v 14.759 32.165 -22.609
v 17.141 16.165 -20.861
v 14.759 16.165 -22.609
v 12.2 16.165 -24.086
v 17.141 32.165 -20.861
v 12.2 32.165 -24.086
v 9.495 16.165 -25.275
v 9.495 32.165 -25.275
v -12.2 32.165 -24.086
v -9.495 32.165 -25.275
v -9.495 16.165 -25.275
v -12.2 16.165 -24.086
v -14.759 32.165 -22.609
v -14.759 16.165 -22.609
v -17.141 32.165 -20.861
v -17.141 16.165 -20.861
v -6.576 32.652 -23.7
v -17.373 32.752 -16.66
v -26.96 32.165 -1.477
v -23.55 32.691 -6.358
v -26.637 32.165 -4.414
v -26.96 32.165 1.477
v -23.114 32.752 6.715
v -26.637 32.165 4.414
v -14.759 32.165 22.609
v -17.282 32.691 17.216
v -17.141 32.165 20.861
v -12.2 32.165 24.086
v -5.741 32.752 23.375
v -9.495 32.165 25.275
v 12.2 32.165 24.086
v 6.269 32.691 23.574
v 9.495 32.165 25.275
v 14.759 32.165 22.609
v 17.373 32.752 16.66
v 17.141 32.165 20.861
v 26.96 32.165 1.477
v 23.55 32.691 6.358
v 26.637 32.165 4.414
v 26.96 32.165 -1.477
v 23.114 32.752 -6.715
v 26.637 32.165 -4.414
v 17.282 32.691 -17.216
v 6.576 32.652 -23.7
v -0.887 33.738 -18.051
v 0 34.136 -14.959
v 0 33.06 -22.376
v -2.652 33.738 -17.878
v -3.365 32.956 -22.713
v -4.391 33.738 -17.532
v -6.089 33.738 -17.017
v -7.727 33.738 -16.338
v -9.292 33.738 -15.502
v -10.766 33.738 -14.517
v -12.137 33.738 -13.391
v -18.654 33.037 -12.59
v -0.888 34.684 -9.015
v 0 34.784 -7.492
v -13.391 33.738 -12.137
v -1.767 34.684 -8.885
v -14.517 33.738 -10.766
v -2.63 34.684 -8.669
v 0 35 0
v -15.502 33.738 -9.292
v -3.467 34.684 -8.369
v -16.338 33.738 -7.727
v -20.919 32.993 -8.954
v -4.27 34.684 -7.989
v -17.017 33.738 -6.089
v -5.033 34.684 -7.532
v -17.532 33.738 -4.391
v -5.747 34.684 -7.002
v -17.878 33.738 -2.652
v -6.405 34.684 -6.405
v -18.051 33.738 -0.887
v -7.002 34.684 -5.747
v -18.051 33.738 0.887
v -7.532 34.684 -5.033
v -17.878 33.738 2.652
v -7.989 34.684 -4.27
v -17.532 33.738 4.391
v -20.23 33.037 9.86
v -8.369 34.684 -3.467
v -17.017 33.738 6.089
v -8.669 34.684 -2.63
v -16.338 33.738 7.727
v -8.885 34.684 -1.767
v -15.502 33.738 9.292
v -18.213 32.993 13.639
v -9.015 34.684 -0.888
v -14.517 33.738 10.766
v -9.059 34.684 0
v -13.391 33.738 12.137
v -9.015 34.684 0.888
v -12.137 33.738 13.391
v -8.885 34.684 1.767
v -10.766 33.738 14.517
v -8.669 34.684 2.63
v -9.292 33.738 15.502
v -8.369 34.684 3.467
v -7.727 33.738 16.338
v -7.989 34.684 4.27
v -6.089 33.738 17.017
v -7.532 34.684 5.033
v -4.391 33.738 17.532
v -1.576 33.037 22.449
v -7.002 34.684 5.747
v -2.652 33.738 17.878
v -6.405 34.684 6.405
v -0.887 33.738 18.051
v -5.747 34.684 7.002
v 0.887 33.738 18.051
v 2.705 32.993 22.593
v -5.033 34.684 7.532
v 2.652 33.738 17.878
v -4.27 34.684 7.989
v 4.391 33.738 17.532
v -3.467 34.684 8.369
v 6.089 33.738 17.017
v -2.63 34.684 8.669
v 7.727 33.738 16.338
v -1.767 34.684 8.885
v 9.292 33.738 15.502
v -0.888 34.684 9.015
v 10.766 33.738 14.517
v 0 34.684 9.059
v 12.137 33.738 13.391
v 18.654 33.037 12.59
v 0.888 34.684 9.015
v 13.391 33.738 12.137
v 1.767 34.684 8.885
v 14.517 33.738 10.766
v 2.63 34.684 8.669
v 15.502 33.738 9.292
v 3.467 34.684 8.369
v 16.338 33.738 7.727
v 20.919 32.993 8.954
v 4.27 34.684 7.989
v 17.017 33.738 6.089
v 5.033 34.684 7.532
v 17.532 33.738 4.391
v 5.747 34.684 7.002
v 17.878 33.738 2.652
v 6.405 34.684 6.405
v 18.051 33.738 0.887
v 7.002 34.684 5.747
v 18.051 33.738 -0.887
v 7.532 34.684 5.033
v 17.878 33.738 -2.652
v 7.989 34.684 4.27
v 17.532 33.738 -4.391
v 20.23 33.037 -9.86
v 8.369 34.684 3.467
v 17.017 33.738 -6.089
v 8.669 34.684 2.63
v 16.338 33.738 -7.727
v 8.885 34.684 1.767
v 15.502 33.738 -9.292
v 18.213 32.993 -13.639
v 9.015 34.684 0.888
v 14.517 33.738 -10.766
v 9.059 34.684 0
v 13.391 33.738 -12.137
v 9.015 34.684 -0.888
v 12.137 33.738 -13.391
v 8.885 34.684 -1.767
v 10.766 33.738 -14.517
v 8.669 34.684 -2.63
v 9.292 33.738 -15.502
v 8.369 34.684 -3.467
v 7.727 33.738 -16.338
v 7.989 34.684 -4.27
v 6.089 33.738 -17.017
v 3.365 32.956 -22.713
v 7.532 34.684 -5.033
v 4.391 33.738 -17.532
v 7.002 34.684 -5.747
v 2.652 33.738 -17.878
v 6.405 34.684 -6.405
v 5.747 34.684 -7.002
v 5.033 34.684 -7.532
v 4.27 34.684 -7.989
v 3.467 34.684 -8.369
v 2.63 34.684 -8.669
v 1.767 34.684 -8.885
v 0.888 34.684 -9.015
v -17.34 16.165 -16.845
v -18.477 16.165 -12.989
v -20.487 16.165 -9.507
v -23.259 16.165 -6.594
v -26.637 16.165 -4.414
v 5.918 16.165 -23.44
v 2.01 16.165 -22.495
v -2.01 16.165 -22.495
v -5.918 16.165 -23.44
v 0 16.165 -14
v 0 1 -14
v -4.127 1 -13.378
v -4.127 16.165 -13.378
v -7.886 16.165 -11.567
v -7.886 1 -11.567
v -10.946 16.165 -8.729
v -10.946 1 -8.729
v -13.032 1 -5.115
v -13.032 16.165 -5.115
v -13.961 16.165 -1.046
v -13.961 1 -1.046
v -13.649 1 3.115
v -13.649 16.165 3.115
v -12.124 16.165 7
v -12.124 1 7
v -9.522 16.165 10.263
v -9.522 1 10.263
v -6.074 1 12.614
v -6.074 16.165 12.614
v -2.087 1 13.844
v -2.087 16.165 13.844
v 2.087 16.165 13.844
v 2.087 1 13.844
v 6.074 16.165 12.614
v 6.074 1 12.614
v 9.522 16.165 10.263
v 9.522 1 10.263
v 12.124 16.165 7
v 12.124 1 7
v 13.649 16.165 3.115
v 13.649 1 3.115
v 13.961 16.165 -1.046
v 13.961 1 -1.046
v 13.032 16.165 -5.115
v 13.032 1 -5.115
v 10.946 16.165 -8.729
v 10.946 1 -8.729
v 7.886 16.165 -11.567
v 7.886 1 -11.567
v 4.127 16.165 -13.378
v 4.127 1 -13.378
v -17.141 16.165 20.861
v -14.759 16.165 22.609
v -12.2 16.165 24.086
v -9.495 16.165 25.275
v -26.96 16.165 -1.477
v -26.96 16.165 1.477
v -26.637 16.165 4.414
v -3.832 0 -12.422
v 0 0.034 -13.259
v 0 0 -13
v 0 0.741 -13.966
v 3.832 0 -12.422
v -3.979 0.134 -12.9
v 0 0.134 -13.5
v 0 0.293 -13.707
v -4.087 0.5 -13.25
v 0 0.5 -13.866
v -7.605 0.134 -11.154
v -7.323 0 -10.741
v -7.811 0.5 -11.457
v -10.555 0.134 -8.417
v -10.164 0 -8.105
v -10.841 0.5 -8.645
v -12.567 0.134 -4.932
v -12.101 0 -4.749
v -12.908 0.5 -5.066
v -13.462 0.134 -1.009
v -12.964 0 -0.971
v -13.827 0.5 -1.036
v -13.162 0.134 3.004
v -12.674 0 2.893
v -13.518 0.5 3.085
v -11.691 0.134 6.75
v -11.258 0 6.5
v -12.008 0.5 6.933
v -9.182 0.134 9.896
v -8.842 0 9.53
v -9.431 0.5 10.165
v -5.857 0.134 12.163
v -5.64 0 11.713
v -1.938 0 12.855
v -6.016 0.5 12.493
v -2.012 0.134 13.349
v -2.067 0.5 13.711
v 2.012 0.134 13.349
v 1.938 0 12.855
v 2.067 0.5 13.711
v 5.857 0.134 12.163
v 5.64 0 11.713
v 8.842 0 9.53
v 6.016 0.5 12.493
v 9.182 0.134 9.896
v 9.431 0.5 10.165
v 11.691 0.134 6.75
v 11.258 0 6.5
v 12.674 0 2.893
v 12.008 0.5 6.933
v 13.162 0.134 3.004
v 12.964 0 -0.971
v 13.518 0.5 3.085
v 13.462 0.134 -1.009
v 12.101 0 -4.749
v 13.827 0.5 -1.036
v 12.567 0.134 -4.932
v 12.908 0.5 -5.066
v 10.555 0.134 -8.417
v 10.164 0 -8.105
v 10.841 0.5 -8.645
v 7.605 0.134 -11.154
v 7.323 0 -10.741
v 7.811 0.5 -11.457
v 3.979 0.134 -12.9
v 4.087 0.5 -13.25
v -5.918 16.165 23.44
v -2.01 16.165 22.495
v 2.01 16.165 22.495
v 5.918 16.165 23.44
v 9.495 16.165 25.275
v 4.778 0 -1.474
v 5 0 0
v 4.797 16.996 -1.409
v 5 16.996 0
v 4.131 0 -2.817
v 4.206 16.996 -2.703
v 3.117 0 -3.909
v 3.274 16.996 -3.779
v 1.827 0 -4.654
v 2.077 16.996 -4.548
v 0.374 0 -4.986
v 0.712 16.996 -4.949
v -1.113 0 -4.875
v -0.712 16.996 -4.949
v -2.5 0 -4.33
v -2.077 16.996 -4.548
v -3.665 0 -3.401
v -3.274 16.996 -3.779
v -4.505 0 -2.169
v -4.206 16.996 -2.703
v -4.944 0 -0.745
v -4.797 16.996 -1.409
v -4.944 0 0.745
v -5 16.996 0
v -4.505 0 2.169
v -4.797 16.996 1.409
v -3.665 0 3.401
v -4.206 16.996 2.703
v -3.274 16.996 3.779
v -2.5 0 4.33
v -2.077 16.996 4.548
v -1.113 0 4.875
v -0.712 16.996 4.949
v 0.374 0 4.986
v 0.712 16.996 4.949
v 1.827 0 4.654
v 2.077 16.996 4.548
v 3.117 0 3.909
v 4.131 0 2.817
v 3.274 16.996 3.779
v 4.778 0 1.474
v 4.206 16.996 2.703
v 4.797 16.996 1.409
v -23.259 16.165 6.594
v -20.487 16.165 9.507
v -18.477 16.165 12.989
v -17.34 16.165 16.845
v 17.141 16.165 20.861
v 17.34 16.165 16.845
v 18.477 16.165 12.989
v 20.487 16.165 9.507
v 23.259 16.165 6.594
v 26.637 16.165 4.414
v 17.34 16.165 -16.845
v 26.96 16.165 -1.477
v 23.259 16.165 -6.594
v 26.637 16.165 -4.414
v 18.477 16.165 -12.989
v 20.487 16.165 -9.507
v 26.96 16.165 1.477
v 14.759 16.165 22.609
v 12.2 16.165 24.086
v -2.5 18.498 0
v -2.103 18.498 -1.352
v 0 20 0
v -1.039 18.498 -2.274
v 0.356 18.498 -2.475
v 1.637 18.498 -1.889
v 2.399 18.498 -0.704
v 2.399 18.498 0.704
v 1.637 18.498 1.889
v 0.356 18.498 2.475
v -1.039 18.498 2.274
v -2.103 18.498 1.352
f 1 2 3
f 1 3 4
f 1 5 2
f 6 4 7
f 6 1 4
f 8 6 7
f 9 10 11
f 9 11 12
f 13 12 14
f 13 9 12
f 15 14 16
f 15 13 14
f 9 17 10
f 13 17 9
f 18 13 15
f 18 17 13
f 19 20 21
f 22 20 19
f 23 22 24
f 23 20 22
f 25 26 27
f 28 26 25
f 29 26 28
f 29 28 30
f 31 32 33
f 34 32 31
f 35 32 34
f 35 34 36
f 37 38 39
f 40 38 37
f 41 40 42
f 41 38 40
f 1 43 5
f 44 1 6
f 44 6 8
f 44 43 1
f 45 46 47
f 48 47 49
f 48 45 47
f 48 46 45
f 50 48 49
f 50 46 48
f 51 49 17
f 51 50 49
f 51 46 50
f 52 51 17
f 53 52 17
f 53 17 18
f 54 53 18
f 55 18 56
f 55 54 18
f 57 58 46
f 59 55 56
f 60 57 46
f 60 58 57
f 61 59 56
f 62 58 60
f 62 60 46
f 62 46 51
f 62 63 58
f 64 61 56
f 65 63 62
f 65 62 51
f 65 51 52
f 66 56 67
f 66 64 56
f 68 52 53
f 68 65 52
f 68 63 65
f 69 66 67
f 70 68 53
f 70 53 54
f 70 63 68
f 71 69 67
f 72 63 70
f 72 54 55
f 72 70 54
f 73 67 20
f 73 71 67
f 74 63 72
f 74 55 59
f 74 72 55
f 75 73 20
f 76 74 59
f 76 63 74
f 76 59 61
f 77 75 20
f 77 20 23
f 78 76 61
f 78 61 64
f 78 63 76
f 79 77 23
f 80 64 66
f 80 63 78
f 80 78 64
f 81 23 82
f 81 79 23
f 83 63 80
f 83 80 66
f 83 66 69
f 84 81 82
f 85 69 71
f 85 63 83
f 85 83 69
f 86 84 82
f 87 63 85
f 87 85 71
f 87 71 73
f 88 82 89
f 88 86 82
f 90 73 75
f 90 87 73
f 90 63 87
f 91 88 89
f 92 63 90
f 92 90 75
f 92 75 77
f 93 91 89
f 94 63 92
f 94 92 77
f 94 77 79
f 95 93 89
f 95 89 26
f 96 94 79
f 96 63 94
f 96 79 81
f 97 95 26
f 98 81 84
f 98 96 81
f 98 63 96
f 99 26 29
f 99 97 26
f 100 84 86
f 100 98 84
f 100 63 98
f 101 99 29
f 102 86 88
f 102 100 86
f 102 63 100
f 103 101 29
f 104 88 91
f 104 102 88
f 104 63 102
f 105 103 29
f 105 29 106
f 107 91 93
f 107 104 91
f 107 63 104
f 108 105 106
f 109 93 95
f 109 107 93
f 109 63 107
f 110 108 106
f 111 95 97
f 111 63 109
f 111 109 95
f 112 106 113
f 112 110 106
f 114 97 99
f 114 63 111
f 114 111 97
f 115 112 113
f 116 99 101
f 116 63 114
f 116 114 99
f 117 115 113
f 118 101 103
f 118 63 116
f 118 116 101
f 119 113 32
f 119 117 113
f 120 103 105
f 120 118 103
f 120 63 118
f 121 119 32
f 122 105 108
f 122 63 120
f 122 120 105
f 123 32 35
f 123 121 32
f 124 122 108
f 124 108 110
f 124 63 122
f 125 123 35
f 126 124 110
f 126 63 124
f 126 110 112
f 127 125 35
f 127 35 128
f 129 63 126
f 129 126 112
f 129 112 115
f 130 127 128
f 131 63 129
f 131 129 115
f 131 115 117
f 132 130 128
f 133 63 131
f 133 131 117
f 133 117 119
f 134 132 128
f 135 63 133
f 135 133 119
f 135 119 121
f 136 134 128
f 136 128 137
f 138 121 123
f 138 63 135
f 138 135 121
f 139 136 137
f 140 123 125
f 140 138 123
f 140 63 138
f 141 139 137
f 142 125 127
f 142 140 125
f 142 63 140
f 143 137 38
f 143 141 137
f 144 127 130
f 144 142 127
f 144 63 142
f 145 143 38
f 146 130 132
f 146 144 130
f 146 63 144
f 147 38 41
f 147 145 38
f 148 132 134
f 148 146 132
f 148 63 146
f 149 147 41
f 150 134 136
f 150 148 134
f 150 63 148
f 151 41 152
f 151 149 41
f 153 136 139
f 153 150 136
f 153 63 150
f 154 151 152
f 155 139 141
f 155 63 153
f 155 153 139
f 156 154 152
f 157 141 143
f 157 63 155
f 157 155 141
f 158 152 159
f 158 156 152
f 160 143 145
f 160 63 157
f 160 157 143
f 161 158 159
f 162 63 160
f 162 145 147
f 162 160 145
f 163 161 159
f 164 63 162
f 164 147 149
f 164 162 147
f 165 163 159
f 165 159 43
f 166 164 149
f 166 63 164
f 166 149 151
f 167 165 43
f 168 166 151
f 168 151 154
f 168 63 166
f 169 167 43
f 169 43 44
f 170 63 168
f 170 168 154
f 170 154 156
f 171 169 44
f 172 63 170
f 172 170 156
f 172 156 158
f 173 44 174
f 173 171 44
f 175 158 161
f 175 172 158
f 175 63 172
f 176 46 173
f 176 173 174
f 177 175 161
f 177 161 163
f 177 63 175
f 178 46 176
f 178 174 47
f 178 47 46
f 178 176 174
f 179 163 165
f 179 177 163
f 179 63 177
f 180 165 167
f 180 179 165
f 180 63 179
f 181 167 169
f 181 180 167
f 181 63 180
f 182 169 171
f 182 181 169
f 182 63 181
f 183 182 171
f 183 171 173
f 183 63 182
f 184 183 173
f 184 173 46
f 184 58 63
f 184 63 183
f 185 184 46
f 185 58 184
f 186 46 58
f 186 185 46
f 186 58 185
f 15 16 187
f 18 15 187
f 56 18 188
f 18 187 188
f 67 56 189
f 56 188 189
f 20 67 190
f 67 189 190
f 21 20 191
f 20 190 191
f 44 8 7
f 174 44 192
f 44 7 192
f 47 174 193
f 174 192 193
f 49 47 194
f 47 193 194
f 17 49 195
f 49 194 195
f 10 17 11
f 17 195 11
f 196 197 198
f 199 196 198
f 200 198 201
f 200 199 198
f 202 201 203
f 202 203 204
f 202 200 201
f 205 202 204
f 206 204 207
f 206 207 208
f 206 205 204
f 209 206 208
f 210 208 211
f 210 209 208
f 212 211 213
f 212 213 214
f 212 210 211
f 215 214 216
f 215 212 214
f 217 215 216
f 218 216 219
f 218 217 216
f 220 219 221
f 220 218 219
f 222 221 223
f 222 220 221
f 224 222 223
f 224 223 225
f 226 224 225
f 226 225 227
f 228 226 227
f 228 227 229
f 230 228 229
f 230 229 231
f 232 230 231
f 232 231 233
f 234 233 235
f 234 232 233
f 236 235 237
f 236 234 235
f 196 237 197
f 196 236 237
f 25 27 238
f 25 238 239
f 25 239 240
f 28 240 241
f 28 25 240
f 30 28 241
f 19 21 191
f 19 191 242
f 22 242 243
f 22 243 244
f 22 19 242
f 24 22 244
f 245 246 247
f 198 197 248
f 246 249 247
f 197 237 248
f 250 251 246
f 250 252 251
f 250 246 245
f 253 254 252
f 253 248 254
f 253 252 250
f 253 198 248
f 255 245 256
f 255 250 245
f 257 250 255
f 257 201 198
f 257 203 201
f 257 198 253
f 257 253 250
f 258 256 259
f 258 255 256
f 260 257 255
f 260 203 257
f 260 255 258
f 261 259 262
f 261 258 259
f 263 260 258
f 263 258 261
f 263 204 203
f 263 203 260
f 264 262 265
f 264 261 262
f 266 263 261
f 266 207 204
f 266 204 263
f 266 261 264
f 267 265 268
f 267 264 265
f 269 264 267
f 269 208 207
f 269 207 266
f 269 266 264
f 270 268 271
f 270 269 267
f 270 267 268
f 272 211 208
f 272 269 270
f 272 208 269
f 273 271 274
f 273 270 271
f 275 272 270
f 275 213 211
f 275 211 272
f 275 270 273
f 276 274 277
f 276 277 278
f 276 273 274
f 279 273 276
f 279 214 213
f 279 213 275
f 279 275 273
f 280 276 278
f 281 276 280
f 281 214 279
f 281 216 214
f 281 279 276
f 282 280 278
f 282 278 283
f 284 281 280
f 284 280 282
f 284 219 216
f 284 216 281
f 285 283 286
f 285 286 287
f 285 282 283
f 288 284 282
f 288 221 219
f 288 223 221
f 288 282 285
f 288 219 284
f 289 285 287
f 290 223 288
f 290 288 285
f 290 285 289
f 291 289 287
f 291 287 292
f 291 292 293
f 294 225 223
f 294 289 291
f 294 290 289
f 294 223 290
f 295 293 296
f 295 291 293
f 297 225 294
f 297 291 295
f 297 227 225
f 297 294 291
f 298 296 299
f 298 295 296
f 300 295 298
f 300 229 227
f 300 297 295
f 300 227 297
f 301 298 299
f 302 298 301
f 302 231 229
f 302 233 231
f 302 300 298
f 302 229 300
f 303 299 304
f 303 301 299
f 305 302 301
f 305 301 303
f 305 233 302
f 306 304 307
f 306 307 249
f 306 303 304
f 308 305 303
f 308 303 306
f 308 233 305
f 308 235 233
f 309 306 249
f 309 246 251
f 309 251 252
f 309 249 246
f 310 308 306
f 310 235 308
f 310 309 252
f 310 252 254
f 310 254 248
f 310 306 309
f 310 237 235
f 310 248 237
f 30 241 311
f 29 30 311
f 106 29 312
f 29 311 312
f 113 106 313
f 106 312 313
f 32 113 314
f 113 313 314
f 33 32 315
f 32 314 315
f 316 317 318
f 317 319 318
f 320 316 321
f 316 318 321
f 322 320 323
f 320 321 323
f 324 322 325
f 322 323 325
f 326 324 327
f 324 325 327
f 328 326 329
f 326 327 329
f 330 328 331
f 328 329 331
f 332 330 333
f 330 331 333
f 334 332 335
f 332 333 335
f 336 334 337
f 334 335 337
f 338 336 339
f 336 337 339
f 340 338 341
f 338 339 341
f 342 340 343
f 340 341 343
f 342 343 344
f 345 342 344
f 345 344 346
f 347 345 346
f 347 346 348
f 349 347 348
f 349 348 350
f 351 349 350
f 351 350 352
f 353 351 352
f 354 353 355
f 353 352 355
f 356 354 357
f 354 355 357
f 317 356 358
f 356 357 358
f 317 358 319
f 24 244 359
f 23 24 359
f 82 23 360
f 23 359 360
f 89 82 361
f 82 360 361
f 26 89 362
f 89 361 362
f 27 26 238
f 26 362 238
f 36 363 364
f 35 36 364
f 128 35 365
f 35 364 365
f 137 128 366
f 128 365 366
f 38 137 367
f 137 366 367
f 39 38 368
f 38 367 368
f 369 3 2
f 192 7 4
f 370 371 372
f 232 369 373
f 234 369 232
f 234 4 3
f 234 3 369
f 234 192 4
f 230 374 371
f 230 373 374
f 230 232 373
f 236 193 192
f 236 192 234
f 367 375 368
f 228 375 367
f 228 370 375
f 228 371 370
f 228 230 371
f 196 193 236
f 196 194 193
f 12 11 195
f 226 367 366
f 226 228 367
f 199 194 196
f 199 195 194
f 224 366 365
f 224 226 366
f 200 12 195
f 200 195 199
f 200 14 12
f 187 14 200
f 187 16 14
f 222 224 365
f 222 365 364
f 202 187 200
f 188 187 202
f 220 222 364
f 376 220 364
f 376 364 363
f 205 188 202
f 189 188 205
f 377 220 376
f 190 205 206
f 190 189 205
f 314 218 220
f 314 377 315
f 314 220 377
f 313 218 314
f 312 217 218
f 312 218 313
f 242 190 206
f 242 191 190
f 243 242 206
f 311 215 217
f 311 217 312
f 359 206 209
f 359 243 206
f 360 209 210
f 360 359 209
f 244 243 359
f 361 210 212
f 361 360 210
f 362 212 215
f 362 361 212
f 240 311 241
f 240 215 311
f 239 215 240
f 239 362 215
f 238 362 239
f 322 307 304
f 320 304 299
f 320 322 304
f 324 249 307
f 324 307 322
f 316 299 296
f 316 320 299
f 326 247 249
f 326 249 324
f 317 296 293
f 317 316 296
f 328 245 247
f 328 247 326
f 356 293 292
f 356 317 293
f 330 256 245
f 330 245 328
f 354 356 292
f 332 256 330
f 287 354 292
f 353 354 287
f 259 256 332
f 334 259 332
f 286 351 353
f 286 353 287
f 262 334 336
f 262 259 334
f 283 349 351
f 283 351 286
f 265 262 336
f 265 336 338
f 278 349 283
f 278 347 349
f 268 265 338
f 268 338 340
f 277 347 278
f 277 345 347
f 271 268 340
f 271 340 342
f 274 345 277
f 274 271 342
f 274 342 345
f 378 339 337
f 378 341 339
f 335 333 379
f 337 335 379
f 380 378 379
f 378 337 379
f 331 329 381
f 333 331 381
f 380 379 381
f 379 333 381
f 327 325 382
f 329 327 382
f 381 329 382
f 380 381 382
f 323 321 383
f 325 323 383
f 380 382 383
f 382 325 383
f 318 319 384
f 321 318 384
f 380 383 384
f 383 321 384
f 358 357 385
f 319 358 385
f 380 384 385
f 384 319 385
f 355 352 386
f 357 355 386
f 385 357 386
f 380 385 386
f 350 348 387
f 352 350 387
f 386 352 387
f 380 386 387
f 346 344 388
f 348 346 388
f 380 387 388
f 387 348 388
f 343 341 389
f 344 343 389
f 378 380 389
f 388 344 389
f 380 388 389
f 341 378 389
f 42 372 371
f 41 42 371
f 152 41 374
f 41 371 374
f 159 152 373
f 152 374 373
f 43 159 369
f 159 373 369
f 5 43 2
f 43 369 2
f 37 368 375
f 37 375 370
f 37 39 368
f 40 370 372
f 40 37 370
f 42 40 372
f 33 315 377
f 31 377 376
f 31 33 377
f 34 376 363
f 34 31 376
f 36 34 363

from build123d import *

# Parameters (mm, degrees)
CUT_EXTRUDE_1_DEPTH         = 43.576377572
HOLE_WIZARD_10_0_10_1_D     = 10
HOLE_WIZARD_10_0_10_1_DEPTH = 16.995696905
HOLE_WIZARD_10_0_10_1_TIP   = 3.004303095
FILLET_1_R                  = 1


with BuildPart() as part:
    # 草图1 → 旋转1 (revolve)
    with BuildSketch(Plane.XY, mode=Mode.PRIVATE) as revolve_1_sk:
        with BuildLine():
            Line((0, 0), (-14, 0))
            Line((-14, 0), (-14, 16.165246825))
            Line((-14, 16.165246825), (-27, 16.165246825))
            Line((-27, 16.165246825), (-27, 32.165246825))
            ThreePointArc((-27, 32.165246825), (-13.574201869, 34.289369415), (0, 35))
            Line((0, 35), (0, 0))
        make_face()
    revolve(revolve_1_sk.sketch.rotate(Axis((0, 0, 0), (0, 1, 0)), 270), axis=Axis((0, 0, 0), (0, 1, 0)))

    # 草图2 → 切除-拉伸1 (cut, through all)
    with BuildSketch(Plane.XZ.offset(-16.165246825)):
        with BuildLine():
            ThreePointArc((-26.636693093, 4.414360778), (-19.378362398, 11.188102747), (-17.141295122, 20.860872502))
            ThreePointArc((-17.141295122, 20.860872502), (-23.382685902, 13.5), (-26.636693093, 4.414360778))
        make_face()
        with BuildLine():
            ThreePointArc((9.495397971, 25.27523328), (0, 27), (-9.495397971, 25.27523328))
            ThreePointArc((-9.495397971, 25.27523328), (0, 22.376205494), (9.495397971, 25.27523328))
        make_face()
        with BuildLine():
            ThreePointArc((26.636693093, 4.414360778), (23.382685902, 13.5), (17.141295122, 20.860872502))
            ThreePointArc((17.141295122, 20.860872502), (19.378362398, 11.188102747), (26.636693093, 4.414360778))
        make_face()
        with BuildLine():
            ThreePointArc((17.141295122, -20.860872502), (23.382685902, -13.5), (26.636693093, -4.414360778))
            ThreePointArc((26.636693093, -4.414360778), (19.378362398, -11.188102747), (17.141295122, -20.860872502))
        make_face()
        with BuildLine():
            ThreePointArc((9.495397971, -25.27523328), (0, -22.376205494), (-9.495397971, -25.27523328))
            ThreePointArc((-9.495397971, -25.27523328), (0, -27), (9.495397971, -25.27523328))
        make_face()
        with BuildLine():
            ThreePointArc((-17.141295122, -20.860872502), (-19.378362398, -11.188102747), (-26.636693093, -4.414360778))
            ThreePointArc((-26.636693093, -4.414360778), (-23.382685902, -13.5), (-17.141295122, -20.860872502))
        make_face()
    extrude(amount=-CUT_EXTRUDE_1_DEPTH, mode=Mode.SUBTRACT)

    # Ø10.0 (10) 直径孔1
    with Locations(Plane(origin=(0, 0, 0), x_dir=(-1, 0, 0), z_dir=(0, -1, 0))):
        with Locations((0, 0)):
            Hole(HOLE_WIZARD_10_0_10_1_D / 2, depth=HOLE_WIZARD_10_0_10_1_DEPTH)
            with Locations((0, 0, -(HOLE_WIZARD_10_0_10_1_DEPTH + HOLE_WIZARD_10_0_10_1_TIP / 2))):  # 118° drill point
                Cone(0, HOLE_WIZARD_10_0_10_1_D / 2, HOLE_WIZARD_10_0_10_1_TIP, mode=Mode.SUBTRACT)

    # 圆角1
    fillet_1_edges = [part.edges().sort_by_distance(p)[0] for p in [
        (0, 0, 14),
    ]]
    fillet(fillet_1_edges, radius=FILLET_1_R)


solid = part.part
